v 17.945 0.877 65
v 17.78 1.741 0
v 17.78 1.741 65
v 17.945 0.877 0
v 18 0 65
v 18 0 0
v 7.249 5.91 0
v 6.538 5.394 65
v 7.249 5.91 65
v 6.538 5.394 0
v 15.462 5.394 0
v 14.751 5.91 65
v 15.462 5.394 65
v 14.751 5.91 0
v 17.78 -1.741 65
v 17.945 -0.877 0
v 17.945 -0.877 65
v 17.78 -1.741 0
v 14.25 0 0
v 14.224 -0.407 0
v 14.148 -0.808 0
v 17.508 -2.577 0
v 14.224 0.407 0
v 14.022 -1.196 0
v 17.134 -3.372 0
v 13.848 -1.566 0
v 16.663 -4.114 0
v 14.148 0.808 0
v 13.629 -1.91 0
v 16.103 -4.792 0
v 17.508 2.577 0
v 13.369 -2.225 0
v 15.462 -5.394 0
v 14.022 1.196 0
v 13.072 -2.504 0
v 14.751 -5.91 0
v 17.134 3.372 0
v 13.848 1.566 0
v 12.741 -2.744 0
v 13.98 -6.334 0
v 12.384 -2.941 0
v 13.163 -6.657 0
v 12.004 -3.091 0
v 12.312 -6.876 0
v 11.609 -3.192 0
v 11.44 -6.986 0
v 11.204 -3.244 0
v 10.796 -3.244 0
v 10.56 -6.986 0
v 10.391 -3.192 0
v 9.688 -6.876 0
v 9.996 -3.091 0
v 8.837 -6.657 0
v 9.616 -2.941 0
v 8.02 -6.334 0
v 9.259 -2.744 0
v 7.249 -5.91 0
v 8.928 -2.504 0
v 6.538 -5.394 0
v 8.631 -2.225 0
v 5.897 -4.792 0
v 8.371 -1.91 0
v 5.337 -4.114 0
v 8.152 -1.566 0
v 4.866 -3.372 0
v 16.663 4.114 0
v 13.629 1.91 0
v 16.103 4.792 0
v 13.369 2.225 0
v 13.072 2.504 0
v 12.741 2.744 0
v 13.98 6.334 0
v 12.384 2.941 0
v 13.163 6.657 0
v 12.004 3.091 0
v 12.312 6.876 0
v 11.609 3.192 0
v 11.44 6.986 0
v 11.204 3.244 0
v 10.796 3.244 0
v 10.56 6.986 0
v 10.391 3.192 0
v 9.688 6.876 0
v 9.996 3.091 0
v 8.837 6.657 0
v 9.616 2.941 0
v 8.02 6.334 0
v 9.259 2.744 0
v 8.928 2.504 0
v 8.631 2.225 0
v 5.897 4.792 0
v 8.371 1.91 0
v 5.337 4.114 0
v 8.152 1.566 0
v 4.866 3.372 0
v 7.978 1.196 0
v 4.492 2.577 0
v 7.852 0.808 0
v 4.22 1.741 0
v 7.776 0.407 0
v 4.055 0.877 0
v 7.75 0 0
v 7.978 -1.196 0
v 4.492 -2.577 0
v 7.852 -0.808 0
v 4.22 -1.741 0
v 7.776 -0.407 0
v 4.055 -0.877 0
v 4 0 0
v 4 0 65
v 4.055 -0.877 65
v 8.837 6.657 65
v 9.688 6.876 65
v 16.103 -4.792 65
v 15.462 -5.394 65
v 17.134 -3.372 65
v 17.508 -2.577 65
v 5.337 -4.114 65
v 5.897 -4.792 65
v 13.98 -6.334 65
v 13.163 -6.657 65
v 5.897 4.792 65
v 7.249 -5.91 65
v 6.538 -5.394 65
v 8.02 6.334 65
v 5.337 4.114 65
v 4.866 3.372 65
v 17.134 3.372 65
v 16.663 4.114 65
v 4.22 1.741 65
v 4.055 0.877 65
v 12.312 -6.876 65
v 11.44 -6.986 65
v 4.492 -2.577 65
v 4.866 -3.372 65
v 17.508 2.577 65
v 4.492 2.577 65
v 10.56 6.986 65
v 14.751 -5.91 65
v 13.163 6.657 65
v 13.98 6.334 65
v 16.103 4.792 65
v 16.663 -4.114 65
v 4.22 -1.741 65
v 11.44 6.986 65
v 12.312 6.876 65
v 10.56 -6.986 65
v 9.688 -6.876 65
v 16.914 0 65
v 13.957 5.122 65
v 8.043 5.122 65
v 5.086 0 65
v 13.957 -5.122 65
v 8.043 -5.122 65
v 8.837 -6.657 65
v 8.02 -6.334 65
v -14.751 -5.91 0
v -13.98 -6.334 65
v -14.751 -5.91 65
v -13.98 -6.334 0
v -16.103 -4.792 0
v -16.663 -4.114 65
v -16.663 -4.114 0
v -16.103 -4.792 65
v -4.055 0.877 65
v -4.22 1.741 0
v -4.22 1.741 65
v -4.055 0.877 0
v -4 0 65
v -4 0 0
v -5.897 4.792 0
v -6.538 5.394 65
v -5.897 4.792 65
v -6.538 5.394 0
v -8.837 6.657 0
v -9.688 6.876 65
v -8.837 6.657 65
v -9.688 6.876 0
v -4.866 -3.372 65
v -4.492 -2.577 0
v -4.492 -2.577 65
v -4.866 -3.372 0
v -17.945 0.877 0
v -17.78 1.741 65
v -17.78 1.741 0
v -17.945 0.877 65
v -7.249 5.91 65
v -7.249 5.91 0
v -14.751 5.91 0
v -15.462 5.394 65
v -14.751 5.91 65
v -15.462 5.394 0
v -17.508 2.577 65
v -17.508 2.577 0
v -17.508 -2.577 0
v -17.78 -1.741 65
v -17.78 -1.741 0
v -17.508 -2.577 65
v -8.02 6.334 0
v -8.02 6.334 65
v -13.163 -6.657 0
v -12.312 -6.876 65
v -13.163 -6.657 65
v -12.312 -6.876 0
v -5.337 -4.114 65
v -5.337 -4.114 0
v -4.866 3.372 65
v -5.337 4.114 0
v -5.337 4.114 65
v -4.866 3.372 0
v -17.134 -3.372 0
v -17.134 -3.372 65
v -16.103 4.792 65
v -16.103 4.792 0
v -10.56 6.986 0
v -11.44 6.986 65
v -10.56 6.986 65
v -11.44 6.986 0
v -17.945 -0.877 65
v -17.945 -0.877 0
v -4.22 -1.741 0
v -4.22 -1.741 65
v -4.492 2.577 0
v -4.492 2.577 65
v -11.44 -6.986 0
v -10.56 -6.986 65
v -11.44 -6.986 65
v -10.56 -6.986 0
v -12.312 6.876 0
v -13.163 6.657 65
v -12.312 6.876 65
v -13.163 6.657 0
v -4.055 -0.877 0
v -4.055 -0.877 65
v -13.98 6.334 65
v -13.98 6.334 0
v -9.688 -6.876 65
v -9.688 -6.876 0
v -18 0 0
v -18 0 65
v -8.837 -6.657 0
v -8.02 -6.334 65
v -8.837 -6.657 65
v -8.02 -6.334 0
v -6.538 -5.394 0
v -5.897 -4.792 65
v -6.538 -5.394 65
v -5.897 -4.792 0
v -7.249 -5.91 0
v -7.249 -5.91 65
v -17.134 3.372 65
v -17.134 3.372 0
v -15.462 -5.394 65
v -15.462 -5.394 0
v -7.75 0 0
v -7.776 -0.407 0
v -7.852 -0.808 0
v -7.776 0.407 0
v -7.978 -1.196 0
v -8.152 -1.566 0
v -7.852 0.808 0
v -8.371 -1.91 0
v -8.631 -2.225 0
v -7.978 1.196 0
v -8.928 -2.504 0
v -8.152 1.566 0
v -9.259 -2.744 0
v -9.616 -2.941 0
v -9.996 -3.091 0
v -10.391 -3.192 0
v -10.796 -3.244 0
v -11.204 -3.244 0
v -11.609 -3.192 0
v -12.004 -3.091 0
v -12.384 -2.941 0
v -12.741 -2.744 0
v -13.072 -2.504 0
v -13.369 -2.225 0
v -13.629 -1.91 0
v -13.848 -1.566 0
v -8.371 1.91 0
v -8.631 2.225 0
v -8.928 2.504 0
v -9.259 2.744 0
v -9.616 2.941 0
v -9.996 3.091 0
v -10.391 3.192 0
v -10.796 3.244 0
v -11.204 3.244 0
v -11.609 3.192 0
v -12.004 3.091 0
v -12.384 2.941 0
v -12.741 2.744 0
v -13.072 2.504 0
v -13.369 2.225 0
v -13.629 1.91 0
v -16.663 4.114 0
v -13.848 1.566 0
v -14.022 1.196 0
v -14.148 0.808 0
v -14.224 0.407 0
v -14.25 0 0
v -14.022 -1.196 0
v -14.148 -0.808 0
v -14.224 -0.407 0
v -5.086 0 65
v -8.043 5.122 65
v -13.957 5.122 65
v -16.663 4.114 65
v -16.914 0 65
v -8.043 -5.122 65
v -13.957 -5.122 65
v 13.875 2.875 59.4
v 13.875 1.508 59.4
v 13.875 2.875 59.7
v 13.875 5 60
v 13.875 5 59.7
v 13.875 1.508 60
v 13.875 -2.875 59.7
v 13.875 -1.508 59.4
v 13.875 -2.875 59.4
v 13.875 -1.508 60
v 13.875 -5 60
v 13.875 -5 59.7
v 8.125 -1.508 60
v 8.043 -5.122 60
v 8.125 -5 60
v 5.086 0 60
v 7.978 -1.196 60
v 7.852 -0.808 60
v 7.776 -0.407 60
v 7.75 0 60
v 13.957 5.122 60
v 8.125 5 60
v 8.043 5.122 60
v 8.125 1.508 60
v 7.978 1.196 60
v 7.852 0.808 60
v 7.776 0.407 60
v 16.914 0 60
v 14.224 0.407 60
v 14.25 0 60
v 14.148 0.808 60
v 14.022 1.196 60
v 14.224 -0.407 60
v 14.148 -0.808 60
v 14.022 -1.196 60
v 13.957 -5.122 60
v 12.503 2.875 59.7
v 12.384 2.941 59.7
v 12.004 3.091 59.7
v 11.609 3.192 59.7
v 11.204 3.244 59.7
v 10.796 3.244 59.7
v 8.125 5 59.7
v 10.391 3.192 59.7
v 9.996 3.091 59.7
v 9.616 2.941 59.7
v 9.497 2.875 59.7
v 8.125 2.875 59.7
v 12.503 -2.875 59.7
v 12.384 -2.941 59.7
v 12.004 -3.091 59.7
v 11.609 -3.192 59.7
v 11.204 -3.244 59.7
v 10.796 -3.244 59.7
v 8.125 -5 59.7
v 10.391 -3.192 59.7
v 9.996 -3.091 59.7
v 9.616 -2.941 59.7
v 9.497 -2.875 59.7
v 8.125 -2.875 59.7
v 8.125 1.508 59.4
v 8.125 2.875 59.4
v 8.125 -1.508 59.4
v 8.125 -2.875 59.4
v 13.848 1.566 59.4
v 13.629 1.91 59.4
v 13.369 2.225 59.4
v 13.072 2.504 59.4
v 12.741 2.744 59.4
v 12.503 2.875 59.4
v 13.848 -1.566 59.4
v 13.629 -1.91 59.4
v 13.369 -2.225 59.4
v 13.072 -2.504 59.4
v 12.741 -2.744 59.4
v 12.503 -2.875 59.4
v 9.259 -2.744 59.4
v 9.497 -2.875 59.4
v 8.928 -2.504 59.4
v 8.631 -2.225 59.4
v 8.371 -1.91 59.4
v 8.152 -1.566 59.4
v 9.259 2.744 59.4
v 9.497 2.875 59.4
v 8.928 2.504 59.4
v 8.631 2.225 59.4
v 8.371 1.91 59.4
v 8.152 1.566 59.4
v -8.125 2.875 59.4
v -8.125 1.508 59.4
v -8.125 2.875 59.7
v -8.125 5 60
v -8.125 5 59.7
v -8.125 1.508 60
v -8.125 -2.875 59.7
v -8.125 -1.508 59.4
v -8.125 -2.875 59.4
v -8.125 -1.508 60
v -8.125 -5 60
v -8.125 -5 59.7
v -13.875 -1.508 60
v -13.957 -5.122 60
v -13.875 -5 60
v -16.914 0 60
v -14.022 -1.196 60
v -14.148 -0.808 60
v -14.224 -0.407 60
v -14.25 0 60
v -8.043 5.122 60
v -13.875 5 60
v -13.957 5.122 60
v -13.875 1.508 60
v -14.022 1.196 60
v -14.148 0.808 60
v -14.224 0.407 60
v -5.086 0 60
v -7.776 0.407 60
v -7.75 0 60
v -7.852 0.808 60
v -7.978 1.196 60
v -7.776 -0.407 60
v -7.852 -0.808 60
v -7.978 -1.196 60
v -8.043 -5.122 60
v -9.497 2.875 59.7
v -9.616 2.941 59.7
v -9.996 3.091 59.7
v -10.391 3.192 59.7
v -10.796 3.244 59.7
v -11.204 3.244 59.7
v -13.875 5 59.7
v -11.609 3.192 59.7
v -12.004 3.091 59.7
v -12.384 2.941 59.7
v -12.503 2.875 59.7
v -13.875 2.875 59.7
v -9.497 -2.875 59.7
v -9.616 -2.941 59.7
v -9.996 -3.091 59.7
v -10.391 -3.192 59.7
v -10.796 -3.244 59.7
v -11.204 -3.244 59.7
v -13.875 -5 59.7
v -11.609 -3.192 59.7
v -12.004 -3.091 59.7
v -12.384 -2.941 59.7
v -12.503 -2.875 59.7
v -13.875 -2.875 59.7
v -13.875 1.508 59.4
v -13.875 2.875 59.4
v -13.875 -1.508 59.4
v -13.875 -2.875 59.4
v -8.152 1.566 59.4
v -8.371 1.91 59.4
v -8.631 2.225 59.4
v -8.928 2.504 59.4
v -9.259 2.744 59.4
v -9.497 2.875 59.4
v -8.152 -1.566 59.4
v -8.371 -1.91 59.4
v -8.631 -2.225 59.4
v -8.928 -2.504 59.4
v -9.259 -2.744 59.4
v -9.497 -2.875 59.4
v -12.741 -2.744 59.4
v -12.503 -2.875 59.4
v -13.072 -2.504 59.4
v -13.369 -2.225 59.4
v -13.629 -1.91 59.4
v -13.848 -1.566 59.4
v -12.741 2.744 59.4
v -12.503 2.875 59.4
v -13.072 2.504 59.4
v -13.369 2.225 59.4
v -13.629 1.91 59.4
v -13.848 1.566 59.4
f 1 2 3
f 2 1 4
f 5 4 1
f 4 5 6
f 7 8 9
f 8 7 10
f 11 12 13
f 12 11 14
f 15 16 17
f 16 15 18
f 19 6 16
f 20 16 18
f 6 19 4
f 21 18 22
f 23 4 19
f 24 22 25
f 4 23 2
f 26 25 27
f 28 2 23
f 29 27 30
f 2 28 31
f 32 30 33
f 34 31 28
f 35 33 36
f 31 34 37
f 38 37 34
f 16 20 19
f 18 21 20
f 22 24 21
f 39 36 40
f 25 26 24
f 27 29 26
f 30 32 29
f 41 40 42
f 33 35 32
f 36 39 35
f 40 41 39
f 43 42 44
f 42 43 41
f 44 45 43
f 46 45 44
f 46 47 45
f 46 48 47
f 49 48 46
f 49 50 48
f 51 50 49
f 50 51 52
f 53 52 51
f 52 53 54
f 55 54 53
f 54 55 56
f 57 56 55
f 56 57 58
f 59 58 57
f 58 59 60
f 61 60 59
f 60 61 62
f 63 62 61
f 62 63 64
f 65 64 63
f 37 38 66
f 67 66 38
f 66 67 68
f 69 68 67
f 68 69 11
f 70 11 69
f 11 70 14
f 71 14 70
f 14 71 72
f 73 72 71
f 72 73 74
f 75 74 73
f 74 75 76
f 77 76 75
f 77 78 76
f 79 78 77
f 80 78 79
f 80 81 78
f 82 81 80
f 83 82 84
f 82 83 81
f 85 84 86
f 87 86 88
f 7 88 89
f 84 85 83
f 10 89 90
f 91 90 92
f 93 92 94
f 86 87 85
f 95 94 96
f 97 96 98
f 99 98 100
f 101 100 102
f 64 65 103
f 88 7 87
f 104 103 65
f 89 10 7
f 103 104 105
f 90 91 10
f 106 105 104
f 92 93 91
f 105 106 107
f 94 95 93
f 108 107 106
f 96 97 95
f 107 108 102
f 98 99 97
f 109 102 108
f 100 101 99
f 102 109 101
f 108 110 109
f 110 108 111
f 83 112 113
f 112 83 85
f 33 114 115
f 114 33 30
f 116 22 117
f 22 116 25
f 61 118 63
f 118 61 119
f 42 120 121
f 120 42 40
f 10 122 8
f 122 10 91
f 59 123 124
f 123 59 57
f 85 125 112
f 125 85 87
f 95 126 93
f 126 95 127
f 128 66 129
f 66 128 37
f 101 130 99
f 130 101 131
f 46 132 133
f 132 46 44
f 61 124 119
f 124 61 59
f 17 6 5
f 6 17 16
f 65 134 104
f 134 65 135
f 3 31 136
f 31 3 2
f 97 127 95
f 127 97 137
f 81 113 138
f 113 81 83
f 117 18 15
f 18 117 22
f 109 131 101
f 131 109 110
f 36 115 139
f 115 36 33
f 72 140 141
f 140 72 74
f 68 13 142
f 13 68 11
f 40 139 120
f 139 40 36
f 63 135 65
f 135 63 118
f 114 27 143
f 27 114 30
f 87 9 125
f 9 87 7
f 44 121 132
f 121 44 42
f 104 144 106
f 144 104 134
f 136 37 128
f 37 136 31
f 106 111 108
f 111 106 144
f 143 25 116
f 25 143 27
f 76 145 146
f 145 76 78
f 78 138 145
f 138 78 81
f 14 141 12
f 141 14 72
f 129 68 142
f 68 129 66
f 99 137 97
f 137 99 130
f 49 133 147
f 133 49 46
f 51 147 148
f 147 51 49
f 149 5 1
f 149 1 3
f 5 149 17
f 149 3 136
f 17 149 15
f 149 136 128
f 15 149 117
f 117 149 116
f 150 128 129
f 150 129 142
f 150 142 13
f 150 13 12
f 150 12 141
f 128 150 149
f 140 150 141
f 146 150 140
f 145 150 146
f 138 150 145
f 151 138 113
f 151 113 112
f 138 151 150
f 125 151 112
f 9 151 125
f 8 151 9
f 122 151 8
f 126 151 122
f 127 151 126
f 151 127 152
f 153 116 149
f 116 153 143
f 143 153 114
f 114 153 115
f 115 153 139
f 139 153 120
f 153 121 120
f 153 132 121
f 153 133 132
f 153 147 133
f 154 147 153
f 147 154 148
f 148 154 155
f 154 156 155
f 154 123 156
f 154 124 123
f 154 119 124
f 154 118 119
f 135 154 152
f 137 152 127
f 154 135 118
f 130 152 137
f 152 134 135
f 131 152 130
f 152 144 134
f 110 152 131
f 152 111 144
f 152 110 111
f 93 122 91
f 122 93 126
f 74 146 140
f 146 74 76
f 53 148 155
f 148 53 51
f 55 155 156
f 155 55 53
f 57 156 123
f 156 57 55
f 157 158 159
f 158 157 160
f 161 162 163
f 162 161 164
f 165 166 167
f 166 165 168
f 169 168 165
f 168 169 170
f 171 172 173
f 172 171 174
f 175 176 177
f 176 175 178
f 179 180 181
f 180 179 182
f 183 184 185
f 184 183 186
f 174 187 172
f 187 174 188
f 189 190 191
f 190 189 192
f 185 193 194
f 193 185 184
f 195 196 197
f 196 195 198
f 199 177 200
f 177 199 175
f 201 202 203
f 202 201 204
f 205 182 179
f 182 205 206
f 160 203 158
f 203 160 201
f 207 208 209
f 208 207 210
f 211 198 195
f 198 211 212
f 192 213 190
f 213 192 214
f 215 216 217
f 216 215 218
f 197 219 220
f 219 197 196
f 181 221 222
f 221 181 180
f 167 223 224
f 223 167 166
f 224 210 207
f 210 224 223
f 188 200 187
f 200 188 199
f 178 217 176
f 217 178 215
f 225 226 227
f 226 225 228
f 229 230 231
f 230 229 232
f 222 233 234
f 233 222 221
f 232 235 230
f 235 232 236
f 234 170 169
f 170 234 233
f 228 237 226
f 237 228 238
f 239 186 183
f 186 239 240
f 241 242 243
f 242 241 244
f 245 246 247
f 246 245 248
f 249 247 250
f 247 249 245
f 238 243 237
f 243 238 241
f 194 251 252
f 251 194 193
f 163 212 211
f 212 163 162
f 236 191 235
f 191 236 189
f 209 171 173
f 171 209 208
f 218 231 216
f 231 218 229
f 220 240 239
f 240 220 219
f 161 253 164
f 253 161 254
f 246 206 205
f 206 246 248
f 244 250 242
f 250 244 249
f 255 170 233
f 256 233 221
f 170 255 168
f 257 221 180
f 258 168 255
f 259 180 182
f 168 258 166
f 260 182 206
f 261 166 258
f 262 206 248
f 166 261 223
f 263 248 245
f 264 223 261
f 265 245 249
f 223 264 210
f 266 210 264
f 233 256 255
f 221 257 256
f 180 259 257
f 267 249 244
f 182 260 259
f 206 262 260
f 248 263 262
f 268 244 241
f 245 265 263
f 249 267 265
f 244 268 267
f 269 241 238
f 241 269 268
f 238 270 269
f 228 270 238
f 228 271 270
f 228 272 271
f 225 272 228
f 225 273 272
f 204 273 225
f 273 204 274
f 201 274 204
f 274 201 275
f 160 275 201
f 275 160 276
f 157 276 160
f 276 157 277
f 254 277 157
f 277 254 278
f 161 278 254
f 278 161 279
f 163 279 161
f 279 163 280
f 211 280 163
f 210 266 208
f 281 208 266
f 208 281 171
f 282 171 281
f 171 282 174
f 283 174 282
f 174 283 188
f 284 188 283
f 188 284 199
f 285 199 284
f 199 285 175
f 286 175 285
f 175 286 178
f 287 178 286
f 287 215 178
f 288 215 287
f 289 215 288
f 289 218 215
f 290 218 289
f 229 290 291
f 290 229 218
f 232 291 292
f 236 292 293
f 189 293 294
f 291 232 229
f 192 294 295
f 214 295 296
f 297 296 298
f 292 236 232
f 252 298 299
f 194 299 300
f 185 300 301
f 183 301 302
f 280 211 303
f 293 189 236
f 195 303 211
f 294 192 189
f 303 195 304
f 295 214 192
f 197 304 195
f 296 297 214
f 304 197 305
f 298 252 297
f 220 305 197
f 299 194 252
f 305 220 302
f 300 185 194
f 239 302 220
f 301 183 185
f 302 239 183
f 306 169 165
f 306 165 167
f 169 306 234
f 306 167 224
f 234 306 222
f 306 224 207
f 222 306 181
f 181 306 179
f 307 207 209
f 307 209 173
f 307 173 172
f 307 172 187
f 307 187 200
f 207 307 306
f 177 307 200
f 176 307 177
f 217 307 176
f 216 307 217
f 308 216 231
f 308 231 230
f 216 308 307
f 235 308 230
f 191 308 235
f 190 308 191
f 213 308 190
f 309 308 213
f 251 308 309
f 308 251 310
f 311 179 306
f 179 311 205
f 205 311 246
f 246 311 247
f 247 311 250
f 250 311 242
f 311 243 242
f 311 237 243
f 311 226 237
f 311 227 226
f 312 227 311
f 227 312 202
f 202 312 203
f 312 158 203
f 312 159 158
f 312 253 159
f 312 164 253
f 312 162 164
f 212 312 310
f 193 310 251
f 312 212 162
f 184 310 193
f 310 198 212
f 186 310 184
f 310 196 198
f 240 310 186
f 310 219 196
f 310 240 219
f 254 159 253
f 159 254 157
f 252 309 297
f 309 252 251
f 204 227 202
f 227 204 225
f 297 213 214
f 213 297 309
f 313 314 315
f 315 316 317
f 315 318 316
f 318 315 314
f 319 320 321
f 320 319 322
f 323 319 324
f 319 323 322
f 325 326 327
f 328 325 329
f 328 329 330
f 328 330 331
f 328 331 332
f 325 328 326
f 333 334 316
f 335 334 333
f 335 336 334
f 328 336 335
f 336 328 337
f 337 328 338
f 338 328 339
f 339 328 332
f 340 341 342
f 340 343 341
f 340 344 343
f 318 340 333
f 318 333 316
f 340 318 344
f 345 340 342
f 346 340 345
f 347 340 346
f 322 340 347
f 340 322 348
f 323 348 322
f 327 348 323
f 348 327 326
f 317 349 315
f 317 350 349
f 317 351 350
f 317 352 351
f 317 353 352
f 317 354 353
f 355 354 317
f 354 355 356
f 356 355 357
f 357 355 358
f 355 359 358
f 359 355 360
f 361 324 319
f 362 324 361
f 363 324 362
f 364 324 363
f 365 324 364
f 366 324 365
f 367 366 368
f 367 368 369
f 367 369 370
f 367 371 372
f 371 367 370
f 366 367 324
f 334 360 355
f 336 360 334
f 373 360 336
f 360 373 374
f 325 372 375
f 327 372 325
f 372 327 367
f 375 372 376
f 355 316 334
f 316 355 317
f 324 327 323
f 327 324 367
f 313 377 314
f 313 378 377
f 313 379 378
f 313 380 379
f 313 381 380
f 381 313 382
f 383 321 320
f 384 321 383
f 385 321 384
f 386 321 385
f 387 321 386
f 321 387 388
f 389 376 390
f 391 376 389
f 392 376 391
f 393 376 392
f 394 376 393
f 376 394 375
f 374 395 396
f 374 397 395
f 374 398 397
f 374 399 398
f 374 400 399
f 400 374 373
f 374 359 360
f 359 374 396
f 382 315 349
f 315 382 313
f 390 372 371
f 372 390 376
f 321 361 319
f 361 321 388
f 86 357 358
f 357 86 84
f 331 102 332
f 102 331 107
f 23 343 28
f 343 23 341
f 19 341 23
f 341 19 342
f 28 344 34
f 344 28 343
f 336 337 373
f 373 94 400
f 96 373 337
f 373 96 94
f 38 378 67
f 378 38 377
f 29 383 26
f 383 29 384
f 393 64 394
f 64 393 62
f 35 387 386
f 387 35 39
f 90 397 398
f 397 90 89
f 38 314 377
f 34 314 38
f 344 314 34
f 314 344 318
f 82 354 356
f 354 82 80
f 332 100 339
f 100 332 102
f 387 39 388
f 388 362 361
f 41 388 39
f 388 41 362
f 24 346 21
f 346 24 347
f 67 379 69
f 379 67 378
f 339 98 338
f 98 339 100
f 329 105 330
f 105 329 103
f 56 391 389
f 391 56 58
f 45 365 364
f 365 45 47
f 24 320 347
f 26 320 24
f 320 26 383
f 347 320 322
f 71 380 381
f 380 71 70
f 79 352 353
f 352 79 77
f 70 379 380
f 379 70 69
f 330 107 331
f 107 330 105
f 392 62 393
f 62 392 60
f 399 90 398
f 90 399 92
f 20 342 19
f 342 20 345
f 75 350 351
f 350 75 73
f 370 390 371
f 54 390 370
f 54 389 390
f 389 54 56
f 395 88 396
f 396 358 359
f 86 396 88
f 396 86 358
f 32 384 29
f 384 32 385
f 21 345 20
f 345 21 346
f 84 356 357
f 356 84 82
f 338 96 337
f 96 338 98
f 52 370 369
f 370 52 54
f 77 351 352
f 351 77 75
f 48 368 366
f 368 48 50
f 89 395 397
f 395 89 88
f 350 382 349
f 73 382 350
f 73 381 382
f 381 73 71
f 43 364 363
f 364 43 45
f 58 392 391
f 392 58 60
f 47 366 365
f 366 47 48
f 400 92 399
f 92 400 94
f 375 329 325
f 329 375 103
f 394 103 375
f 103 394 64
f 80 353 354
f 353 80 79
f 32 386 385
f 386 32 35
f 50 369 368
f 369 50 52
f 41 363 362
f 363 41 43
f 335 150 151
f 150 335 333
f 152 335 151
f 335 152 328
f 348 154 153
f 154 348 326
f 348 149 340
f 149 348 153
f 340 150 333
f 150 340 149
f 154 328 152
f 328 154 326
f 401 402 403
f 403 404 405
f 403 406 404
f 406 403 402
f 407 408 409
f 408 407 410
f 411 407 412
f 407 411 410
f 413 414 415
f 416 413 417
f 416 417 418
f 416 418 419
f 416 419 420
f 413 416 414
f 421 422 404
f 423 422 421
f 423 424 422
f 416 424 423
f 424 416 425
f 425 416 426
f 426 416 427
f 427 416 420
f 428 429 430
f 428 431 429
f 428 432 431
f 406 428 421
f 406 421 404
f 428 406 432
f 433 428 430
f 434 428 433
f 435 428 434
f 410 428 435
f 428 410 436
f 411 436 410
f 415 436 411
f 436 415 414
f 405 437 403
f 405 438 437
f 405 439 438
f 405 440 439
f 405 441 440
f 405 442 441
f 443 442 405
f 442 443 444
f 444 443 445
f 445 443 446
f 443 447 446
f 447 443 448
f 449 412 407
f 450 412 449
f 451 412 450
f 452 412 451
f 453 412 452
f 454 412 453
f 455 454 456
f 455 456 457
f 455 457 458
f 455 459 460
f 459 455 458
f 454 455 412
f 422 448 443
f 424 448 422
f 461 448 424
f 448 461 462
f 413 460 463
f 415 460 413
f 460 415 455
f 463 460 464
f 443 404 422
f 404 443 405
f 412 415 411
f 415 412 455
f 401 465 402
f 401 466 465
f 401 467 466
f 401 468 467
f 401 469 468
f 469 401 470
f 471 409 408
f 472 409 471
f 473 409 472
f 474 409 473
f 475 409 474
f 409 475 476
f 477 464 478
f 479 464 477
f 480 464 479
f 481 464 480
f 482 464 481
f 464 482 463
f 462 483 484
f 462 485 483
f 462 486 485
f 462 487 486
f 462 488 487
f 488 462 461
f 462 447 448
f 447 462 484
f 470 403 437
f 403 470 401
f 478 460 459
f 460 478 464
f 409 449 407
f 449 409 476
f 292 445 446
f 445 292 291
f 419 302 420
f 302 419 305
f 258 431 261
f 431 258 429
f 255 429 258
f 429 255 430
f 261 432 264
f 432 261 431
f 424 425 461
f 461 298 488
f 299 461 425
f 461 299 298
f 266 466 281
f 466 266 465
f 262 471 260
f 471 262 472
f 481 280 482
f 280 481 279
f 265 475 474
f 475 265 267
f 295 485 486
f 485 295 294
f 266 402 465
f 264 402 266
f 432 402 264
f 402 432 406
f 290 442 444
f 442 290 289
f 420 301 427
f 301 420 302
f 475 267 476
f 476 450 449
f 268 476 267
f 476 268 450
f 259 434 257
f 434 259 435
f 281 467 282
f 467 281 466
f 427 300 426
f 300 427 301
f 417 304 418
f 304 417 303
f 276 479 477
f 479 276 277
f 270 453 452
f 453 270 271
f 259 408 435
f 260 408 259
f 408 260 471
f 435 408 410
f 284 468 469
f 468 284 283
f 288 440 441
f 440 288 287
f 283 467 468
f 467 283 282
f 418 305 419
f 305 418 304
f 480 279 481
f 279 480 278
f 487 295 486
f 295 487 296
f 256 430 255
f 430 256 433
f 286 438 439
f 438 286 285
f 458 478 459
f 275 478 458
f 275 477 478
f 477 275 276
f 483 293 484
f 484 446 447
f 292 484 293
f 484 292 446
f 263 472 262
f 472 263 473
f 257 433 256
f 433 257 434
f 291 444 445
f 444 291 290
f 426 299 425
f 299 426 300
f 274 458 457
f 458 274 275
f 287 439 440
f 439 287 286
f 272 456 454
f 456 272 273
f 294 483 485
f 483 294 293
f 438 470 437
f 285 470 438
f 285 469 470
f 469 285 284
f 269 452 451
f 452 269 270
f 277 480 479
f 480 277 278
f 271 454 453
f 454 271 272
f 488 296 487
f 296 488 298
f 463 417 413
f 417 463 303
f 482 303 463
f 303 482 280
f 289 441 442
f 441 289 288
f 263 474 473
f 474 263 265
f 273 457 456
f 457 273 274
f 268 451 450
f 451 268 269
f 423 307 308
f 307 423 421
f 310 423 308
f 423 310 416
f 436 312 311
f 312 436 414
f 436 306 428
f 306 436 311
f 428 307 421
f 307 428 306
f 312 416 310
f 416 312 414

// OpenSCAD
$fn = 50;


difference() {
	union() {
		translate(v = [11.0000000000, 0, 0.0000000000]) {
			cylinder(h = 65, r = 7.0000000000);
		}
		translate(v = [-11.0000000000, 0, 0.0000000000]) {
			cylinder(h = 65, r = 7.0000000000);
		}
	}
	union() {
		translate(v = [11.0000000000, 0, 65]) {
			rotate(a = [0, 0, 0]) {
				difference() {
					union() {
						#translate(v = [-2.8750000000, -5.0000000000, -5.3000000000]) {
							cube(size = [5.7500000000, 10, 0.3000000000]);
						}
						#translate(v = [-2.8750000000, -2.8750000000, -5.6000000000]) {
							cube(size = [5.7500000000, 5.7500000000, 0.3000000000]);
						}
						#translate(v = [-2.8750000000, -5.0000000000, 0]) {
							cube(size = [5.7500000000, 10, 0.3000000000]);
						}
						#translate(v = [-2.8750000000, -2.8750000000, 0.3000000000]) {
							cube(size = [5.7500000000, 5.7500000000, 0.3000000000]);
						}
						#translate(v = [0, 0, -100.0000000000]) {
							cylinder(h = 200, r = 3.2500000000);
						}
						translate(v = [0, 0, -5]) {
							#linear_extrude(height = 5) {
								polygon(points = [[5.9142500000, 0.0000000000], [2.9571250000, 5.1218907443], [-2.9571250000, 5.1218907443], [-5.9142500000, 0.0000000000], [-2.9571250000, -5.1218907443], [2.9571250000, -5.1218907443]]);
							}
						}
						#translate(v = [-2.8750000000, -5.0000000000, -5.3000000000]) {
							cube(size = [5.7500000000, 10, 0.3000000000]);
						}
						#translate(v = [-2.8750000000, -2.8750000000, -5.6000000000]) {
							cube(size = [5.7500000000, 5.7500000000, 0.3000000000]);
						}
						#translate(v = [-2.8750000000, -5.0000000000, 0]) {
							cube(size = [5.7500000000, 10, 0.3000000000]);
						}
						#translate(v = [-2.8750000000, -2.8750000000, 0.3000000000]) {
							cube(size = [5.7500000000, 5.7500000000, 0.3000000000]);
						}
						#translate(v = [0, 0, -100.0000000000]) {
							cylinder(h = 200, r = 3.2500000000);
						}
						#translate(v = [-2.8750000000, -5.0000000000, -5.3000000000]) {
							cube(size = [5.7500000000, 10, 0.3000000000]);
						}
						#translate(v = [-2.8750000000, -2.8750000000, -5.6000000000]) {
							cube(size = [5.7500000000, 5.7500000000, 0.3000000000]);
						}
						#translate(v = [-2.8750000000, -5.0000000000, 0]) {
							cube(size = [5.7500000000, 10, 0.3000000000]);
						}
						#translate(v = [-2.8750000000, -2.8750000000, 0.3000000000]) {
							cube(size = [5.7500000000, 5.7500000000, 0.3000000000]);
						}
						#translate(v = [0, 0, -100.0000000000]) {
							cylinder(h = 200, r = 3.2500000000);
						}
					}
					union();
				}
			}
		}
		translate(v = [-11.0000000000, 0, 65]) {
			rotate(a = [0, 0, 0]) {
				difference() {
					union() {
						#translate(v = [-2.8750000000, -5.0000000000, -5.3000000000]) {
							cube(size = [5.7500000000, 10, 0.3000000000]);
						}
						#translate(v = [-2.8750000000, -2.8750000000, -5.6000000000]) {
							cube(size = [5.7500000000, 5.7500000000, 0.3000000000]);
						}
						#translate(v = [-2.8750000000, -5.0000000000, 0]) {
							cube(size = [5.7500000000, 10, 0.3000000000]);
						}
						#translate(v = [-2.8750000000, -2.8750000000, 0.3000000000]) {
							cube(size = [5.7500000000, 5.7500000000, 0.3000000000]);
						}
						#translate(v = [0, 0, -100.0000000000]) {
							cylinder(h = 200, r = 3.2500000000);
						}
						translate(v = [0, 0, -5]) {
							#linear_extrude(height = 5) {
								polygon(points = [[5.9142500000, 0.0000000000], [2.9571250000, 5.1218907443], [-2.9571250000, 5.1218907443], [-5.9142500000, 0.0000000000], [-2.9571250000, -5.1218907443], [2.9571250000, -5.1218907443]]);
							}
						}
						#translate(v = [-2.8750000000, -5.0000000000, -5.3000000000]) {
							cube(size = [5.7500000000, 10, 0.3000000000]);
						}
						#translate(v = [-2.8750000000, -2.8750000000, -5.6000000000]) {
							cube(size = [5.7500000000, 5.7500000000, 0.3000000000]);
						}
						#translate(v = [-2.8750000000, -5.0000000000, 0]) {
							cube(size = [5.7500000000, 10, 0.3000000000]);
						}
						#translate(v = [-2.8750000000, -2.8750000000, 0.3000000000]) {
							cube(size = [5.7500000000, 5.7500000000, 0.3000000000]);
						}
						#translate(v = [0, 0, -100.0000000000]) {
							cylinder(h = 200, r = 3.2500000000);
						}
						#translate(v = [-2.8750000000, -5.0000000000, -5.3000000000]) {
							cube(size = [5.7500000000, 10, 0.3000000000]);
						}
						#translate(v = [-2.8750000000, -2.8750000000, -5.6000000000]) {
							cube(size = [5.7500000000, 5.7500000000, 0.3000000000]);
						}
						#translate(v = [-2.8750000000, -5.0000000000, 0]) {
							cube(size = [5.7500000000, 10, 0.3000000000]);
						}
						#translate(v = [-2.8750000000, -2.8750000000, 0.3000000000]) {
							cube(size = [5.7500000000, 5.7500000000, 0.3000000000]);
						}
						#translate(v = [0, 0, -100.0000000000]) {
							cylinder(h = 200, r = 3.2500000000);
						}
					}
					union();
				}
			}
		}
	}
}
